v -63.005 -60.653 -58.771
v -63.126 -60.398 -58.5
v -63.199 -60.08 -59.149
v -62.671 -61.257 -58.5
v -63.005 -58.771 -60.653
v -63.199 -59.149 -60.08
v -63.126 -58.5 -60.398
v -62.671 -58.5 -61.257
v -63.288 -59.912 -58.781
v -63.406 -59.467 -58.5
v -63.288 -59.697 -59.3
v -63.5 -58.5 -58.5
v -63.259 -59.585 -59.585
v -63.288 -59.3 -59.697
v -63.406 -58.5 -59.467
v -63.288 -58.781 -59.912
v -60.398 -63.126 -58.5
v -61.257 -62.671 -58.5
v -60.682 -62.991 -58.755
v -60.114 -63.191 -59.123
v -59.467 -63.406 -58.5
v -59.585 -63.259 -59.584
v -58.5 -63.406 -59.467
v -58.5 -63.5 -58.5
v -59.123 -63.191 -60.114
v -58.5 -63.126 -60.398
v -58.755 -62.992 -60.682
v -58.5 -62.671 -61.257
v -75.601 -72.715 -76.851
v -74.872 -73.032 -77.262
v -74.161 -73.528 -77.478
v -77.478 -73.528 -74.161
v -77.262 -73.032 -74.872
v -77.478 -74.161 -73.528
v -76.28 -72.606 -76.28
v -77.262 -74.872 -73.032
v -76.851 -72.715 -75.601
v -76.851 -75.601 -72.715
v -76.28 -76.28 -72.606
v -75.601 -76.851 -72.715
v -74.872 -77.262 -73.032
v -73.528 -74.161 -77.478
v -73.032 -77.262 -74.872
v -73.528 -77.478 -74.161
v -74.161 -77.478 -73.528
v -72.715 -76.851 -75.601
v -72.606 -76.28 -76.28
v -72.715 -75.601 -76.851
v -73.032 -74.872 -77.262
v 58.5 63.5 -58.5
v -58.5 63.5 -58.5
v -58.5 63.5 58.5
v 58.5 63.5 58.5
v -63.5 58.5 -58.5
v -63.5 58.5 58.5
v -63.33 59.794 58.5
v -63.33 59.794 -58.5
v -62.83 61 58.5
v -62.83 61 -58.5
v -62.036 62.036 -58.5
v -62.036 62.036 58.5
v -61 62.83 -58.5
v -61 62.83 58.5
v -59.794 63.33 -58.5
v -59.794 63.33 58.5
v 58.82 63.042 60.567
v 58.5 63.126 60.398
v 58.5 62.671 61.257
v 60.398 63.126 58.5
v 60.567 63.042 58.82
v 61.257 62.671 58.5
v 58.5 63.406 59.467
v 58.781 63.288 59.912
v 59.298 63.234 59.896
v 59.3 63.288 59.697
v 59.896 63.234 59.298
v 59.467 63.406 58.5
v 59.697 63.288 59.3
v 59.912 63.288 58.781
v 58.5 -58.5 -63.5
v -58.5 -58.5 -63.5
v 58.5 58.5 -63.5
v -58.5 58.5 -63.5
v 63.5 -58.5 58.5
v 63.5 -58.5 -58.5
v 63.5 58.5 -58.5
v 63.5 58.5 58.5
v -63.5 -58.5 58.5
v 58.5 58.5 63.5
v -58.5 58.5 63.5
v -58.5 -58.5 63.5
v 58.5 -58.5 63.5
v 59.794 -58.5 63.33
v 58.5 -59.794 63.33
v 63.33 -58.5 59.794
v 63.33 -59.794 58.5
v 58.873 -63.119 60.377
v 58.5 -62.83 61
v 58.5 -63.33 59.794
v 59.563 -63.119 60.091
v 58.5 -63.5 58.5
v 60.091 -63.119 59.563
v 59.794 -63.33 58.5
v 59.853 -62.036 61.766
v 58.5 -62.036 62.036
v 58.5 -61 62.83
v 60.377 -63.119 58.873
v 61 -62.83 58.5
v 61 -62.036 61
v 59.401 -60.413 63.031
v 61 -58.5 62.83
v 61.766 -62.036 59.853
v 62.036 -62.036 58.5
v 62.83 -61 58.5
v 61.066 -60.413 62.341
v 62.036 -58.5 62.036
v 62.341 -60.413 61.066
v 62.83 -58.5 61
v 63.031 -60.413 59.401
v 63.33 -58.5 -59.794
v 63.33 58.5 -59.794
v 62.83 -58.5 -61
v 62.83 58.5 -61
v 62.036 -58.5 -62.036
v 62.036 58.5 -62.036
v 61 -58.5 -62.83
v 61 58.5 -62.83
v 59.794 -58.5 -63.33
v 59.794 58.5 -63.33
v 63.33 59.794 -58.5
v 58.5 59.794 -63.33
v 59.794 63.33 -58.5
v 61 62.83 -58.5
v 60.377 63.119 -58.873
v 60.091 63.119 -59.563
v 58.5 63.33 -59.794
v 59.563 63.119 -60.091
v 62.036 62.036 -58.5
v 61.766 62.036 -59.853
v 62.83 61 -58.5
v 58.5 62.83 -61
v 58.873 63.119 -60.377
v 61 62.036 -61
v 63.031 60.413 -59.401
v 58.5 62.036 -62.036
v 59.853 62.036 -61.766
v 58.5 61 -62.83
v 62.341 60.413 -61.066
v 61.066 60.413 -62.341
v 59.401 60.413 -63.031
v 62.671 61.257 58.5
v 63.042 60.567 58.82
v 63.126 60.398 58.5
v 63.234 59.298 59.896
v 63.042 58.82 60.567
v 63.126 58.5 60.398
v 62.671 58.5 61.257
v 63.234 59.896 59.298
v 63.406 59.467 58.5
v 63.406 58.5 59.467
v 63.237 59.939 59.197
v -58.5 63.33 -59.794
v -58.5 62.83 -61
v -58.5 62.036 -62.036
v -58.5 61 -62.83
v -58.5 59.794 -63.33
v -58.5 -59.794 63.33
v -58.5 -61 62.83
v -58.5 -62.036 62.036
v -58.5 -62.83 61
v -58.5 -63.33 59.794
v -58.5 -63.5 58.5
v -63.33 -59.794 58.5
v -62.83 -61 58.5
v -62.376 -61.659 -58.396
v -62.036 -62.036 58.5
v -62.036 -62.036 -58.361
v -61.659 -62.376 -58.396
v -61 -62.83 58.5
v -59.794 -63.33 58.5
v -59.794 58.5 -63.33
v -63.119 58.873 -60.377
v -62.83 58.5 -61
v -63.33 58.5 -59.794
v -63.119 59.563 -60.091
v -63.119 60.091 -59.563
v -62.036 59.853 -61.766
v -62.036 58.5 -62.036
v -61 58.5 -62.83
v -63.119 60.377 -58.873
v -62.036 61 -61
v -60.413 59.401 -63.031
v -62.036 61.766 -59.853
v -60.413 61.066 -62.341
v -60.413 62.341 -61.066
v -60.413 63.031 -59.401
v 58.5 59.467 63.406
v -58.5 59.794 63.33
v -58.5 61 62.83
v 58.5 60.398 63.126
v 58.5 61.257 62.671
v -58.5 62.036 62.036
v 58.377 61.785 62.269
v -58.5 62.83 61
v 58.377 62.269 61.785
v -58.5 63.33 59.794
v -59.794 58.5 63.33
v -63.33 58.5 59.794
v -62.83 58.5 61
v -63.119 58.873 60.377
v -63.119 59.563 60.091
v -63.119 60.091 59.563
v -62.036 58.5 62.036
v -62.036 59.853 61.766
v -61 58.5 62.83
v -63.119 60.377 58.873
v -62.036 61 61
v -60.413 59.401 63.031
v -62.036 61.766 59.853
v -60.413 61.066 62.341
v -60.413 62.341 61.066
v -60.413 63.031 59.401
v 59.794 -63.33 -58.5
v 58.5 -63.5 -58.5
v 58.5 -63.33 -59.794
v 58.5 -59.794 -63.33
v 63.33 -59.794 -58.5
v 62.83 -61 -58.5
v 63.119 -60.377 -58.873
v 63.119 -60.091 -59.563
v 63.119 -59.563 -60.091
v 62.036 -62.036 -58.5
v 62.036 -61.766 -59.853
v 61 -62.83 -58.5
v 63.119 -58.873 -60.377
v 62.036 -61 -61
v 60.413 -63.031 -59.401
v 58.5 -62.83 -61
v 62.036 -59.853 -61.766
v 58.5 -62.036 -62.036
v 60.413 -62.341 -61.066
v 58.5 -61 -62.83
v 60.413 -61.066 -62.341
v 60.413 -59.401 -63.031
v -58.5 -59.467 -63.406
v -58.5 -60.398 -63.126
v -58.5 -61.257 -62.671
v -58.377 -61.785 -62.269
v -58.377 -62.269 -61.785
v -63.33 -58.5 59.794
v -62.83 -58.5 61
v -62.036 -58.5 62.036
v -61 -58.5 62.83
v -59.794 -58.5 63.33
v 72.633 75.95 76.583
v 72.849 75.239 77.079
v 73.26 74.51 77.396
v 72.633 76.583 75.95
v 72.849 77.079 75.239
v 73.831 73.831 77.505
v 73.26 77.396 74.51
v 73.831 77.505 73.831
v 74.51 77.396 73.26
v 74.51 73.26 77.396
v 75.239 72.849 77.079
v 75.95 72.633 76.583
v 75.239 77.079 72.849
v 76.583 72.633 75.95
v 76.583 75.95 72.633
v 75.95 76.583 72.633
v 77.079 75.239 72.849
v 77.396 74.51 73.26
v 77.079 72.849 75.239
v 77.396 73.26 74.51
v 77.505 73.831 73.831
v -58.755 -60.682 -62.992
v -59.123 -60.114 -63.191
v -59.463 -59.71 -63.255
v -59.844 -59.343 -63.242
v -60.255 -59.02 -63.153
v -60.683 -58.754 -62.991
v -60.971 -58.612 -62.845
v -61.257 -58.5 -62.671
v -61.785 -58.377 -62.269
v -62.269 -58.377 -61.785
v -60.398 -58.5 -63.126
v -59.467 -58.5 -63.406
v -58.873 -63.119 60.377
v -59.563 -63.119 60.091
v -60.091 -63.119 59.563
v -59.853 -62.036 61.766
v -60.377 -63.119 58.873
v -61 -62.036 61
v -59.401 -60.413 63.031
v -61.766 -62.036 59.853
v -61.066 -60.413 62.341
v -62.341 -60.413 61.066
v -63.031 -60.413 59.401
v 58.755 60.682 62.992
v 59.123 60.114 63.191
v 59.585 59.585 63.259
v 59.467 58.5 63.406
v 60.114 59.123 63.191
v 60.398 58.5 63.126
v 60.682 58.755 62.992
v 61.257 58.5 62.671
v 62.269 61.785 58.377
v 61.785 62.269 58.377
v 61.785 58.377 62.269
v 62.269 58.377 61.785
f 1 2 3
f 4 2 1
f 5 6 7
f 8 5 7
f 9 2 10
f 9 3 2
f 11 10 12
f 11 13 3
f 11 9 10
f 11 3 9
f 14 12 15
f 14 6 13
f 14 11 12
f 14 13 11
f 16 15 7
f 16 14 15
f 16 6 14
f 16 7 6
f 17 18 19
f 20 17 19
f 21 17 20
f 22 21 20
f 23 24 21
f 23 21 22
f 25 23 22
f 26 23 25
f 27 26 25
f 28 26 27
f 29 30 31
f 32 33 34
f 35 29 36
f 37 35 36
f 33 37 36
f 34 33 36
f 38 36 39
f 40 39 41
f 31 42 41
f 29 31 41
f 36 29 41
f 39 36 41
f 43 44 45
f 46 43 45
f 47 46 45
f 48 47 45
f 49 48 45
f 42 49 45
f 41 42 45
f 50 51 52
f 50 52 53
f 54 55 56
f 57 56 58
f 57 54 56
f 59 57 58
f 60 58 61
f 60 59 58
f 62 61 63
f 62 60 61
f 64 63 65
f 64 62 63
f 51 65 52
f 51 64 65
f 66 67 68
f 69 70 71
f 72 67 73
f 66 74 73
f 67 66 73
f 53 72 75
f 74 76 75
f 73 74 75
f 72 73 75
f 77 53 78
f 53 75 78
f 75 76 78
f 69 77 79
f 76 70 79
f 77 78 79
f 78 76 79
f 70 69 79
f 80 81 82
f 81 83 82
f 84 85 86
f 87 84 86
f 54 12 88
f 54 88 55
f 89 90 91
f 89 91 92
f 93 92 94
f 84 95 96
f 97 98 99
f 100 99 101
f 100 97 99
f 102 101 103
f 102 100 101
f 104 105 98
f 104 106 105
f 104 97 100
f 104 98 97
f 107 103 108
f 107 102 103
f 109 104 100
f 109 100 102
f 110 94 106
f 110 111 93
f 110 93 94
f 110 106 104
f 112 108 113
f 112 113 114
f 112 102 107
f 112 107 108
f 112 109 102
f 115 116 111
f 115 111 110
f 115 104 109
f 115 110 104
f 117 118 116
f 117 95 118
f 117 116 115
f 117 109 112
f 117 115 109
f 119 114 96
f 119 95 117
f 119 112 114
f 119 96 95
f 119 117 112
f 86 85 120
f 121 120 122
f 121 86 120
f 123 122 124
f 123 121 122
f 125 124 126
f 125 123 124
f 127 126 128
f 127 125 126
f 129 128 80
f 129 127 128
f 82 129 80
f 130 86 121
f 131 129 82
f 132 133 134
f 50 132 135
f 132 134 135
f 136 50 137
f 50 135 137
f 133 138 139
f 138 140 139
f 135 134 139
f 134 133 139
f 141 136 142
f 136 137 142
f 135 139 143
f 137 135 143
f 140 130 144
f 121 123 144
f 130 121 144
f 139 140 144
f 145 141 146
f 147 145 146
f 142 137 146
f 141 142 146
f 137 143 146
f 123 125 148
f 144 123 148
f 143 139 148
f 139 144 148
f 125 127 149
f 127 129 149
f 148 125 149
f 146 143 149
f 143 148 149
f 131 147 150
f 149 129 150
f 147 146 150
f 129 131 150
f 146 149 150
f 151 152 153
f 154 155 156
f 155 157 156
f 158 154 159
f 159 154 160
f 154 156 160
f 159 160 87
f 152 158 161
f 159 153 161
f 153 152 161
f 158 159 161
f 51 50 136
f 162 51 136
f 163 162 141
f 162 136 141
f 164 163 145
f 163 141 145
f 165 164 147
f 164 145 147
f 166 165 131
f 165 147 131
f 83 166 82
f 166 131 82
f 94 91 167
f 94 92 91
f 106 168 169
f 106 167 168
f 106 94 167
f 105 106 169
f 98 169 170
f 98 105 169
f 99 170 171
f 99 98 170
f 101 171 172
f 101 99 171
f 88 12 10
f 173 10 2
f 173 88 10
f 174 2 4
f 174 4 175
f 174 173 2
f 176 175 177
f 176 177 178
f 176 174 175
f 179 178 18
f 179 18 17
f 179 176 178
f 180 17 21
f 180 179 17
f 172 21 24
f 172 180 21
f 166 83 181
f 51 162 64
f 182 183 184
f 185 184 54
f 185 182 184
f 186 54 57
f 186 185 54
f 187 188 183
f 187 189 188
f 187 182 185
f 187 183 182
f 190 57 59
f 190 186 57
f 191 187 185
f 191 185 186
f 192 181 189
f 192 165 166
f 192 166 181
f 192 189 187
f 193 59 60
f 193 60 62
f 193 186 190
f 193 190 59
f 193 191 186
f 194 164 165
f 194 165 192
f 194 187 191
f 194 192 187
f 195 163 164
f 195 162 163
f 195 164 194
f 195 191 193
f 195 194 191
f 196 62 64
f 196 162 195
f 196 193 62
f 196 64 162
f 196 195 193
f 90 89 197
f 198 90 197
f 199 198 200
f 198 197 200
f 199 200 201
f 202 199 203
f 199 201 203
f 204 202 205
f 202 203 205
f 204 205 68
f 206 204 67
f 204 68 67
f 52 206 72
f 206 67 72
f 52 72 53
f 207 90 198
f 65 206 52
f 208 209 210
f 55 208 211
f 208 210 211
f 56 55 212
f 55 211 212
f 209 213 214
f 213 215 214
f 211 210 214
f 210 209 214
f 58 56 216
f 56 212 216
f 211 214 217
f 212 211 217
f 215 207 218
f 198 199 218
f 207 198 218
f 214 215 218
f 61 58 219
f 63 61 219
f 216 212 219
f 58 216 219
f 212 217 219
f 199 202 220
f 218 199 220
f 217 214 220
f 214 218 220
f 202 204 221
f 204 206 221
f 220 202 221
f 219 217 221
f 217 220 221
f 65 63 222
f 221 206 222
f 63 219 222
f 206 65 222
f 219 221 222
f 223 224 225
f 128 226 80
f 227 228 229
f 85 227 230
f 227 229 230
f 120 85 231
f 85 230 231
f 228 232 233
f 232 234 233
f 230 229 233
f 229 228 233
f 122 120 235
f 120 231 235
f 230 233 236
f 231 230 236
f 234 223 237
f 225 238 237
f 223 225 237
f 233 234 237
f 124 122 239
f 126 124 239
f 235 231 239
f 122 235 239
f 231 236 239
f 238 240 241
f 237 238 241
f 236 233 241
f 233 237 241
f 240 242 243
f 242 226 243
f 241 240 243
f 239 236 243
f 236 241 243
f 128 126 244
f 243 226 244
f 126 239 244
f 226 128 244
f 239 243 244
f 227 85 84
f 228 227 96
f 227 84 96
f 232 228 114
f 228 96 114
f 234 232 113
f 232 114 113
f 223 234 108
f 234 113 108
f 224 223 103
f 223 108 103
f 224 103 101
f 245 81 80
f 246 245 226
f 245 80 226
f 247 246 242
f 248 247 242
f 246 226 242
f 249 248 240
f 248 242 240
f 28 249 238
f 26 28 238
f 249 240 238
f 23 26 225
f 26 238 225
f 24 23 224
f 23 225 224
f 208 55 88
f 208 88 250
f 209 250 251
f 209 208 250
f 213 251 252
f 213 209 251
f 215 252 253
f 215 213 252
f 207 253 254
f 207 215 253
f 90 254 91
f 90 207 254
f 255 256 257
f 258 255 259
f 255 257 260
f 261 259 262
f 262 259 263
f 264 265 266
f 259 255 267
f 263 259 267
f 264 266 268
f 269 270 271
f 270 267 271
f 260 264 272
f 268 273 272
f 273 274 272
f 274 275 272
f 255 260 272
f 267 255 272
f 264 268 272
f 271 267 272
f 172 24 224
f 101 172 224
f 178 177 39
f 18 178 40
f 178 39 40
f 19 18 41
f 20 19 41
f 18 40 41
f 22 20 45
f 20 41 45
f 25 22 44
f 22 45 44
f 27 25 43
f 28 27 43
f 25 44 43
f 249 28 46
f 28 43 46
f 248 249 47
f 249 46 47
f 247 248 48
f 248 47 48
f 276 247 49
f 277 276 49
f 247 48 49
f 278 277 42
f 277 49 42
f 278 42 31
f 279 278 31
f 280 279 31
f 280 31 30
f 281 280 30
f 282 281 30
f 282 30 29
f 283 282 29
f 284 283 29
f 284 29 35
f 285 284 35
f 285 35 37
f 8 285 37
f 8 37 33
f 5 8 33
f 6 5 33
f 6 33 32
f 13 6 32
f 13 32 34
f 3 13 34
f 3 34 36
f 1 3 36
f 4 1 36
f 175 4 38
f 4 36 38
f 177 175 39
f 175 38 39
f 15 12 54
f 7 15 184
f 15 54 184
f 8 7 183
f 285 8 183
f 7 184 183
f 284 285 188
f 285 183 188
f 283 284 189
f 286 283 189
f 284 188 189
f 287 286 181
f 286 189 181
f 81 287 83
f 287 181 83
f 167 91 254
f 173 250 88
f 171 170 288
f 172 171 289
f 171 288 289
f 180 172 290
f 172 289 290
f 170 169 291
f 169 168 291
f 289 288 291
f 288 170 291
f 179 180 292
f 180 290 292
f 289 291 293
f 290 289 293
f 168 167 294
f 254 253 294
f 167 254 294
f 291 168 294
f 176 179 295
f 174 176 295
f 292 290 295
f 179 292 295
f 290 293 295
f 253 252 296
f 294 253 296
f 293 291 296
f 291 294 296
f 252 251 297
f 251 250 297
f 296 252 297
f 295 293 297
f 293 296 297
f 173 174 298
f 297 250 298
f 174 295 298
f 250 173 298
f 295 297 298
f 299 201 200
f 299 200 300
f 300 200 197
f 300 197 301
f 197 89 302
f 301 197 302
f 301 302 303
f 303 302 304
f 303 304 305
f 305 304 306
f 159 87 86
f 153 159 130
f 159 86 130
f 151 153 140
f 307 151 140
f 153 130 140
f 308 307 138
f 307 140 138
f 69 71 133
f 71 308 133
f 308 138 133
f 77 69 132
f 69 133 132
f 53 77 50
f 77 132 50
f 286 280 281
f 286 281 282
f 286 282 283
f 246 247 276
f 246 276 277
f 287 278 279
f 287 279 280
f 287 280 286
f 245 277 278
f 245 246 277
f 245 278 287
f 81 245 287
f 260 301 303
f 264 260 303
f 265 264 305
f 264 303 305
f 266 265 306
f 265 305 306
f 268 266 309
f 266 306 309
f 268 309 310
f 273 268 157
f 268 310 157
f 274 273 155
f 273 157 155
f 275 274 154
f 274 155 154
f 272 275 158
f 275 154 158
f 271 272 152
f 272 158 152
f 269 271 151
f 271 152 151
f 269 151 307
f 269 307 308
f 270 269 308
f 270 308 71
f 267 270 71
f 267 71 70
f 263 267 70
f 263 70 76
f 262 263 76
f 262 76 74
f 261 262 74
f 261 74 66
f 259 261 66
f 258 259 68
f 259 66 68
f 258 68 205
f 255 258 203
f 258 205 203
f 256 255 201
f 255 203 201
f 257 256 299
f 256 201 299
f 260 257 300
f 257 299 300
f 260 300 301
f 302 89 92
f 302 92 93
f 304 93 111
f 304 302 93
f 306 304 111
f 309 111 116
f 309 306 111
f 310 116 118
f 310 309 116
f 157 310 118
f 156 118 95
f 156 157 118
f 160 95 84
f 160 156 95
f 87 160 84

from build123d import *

# Parameters (mm, degrees)
F0_W     = 127
F0_H     = 127
F1_DEPTH = 63.5
F4_R     = 5


with BuildPart() as f1:
    # F0 (on Top) → F1 (new body, symmetric)
    with BuildSketch(Plane.XY):
        Rectangle(F0_W, F0_H)
    extrude(amount=F1_DEPTH, both=True)

    # F4
    f4_edges = [f1.edges().sort_by_distance(p)[0] for p in [
        (63.5, 0, 63.5),
        (0, 63.5, 63.5),
        (-63.5, 0, 63.5),
        (0, -63.5, 63.5),
        (0, -63.5, -63.5),
        (63.5, -63.5, 0),
        (-63.5, -63.5, 0),
        (63.5, 0, -63.5),
        (63.5, 63.5, 0),
        (0, 63.5, -63.5),
        (-63.5, 0, -63.5),
        (-63.5, 63.5, 0),
    ]]
    fillet(f4_edges, radius=F4_R)

    # F3 (on 3pt) → F5 (revolve)
    with BuildSketch(Plane(origin=(0, 0, 0), x_dir=(0.7071067812, 0.7071067812, 0), z_dir=(0.7071067812, -0.7071067812, 0))):
        Polygon((-106.1445555206, -75.0555349947), (106.1445555206, 75.0555349947), (104.412504713, 77.5050247374), (-107.8766063282, -72.6060452519), align=None)
    revolve(axis=Axis((0, 0, 0), (0.5773502692, 0.5773502692, 0.5773502692)))


solid = f1.part
